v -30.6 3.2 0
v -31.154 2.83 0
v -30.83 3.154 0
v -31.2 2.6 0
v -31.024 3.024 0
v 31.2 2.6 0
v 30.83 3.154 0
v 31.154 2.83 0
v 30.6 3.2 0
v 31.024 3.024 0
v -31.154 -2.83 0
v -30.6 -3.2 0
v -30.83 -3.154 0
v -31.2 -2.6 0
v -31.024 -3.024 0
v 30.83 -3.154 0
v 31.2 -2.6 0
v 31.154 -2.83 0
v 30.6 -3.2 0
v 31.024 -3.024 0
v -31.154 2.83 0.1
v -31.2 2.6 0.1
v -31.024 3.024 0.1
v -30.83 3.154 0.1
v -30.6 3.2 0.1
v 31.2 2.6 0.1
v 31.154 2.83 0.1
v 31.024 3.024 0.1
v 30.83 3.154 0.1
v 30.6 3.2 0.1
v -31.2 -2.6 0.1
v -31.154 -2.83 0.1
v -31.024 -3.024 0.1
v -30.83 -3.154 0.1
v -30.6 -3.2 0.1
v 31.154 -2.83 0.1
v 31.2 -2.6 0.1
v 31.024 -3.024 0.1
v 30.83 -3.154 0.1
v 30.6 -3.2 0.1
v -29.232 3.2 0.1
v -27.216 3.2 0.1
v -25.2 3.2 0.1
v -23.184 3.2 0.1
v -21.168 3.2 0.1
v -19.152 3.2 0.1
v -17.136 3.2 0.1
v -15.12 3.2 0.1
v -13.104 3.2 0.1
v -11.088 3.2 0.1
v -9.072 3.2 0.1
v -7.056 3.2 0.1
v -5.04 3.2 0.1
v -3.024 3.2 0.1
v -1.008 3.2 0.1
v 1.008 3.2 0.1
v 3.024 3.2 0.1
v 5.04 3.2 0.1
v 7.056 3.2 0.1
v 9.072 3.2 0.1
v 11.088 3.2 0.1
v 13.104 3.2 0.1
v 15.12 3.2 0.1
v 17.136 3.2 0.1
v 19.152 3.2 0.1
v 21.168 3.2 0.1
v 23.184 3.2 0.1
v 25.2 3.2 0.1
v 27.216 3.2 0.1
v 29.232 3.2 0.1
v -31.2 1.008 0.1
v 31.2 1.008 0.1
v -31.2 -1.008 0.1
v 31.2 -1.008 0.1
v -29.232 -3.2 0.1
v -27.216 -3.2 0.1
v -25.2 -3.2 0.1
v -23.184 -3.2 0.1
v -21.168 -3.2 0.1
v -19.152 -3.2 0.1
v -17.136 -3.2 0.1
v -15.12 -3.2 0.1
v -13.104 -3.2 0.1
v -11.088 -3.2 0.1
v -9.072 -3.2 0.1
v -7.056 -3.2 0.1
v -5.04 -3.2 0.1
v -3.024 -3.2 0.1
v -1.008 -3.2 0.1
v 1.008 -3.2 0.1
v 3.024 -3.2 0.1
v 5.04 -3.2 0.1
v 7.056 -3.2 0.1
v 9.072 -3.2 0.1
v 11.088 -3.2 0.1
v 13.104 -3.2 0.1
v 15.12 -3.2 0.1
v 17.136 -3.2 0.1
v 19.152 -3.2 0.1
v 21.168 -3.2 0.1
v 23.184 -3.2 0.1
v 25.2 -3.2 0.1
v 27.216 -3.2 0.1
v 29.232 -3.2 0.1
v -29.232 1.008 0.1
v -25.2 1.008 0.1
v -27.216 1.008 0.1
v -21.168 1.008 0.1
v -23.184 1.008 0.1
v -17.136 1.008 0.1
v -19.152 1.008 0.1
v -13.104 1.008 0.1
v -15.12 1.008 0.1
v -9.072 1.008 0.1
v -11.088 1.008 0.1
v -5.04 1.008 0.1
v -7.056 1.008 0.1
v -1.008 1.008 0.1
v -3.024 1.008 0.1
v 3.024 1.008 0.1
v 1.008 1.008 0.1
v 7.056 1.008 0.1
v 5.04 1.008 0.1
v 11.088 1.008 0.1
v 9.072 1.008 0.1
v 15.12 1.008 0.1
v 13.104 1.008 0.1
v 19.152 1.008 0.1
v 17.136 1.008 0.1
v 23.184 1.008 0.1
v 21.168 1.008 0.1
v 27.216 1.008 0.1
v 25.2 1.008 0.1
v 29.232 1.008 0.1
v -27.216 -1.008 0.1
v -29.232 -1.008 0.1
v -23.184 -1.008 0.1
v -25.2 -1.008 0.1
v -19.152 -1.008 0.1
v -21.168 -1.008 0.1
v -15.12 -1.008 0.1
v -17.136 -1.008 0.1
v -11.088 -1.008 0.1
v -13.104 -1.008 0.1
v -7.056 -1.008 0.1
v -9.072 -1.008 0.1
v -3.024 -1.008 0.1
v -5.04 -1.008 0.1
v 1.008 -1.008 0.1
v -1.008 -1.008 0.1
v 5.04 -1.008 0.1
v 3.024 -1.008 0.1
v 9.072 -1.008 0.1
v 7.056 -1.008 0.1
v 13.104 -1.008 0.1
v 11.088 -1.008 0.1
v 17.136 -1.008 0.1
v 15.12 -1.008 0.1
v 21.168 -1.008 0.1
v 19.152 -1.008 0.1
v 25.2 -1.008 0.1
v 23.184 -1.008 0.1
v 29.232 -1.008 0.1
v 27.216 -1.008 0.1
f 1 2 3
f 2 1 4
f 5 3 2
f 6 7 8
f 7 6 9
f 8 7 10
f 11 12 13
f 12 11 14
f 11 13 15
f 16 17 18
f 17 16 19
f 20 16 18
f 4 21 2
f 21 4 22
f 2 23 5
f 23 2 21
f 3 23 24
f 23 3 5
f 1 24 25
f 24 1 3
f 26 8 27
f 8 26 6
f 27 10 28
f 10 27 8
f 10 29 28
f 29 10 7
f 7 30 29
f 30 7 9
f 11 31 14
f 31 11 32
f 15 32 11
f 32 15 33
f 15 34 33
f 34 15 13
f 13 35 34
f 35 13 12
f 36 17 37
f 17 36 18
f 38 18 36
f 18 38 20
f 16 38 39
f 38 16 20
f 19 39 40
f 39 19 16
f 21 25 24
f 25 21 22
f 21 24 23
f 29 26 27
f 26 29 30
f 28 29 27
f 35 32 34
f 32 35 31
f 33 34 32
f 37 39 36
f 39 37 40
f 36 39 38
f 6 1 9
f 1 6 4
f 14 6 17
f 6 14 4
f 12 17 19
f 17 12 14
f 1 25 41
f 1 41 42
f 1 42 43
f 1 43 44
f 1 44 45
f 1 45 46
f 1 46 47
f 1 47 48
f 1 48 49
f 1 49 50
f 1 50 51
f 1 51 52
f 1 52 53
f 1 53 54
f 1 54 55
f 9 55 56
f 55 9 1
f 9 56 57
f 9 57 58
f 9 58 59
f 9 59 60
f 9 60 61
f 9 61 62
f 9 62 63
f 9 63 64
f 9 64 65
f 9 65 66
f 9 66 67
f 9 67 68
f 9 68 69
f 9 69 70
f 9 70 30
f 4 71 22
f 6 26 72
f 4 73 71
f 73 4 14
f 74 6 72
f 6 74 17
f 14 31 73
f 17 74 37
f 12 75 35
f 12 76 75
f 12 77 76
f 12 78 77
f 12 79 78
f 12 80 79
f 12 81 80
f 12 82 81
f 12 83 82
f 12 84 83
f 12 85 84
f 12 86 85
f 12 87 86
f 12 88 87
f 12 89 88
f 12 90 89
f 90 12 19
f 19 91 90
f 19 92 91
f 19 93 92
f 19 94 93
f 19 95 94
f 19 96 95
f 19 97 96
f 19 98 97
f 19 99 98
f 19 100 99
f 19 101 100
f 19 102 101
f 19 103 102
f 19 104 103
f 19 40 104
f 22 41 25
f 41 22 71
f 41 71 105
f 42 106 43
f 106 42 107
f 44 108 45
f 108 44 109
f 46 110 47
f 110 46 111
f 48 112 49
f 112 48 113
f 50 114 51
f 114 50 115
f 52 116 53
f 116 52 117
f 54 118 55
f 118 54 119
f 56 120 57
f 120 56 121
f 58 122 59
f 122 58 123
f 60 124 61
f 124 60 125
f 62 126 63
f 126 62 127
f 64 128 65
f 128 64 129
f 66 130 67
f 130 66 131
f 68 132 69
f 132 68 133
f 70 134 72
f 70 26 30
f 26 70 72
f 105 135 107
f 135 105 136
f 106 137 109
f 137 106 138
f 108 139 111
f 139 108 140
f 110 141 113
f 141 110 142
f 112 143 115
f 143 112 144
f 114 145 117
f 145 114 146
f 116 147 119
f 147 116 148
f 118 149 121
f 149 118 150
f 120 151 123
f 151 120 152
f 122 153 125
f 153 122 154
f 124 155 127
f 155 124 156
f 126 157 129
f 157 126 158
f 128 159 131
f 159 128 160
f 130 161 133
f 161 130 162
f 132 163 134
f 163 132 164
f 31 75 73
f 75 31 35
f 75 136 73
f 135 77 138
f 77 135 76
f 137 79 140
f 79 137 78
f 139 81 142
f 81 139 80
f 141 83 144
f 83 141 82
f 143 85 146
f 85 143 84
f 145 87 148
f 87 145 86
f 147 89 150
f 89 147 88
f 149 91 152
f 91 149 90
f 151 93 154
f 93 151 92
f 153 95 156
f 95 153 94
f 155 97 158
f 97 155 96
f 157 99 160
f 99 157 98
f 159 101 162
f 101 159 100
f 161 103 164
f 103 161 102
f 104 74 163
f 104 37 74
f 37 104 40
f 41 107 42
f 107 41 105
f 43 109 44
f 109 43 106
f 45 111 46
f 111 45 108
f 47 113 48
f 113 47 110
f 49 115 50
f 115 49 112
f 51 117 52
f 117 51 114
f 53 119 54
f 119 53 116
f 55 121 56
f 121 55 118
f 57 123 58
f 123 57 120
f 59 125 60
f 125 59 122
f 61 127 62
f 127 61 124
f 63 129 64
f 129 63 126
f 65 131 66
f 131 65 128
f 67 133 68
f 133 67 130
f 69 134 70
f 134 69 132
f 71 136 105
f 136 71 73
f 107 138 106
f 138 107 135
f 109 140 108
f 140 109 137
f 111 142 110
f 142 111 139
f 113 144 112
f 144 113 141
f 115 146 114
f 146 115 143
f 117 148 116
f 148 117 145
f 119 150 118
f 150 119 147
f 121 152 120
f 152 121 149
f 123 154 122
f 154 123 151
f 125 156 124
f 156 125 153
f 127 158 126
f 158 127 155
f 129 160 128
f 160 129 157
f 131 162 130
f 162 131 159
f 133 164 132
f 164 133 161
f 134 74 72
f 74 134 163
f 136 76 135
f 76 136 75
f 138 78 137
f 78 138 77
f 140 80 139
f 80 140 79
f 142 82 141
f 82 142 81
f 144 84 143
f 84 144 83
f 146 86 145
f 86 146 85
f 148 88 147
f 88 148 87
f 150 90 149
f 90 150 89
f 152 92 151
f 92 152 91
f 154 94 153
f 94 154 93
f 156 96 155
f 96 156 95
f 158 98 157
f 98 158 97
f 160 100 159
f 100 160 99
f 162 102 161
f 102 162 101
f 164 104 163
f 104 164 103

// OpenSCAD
// file: ../p/1-4cyli.scad
use <../lib.scad>
function ldraw_lib__1_4cyli() = [
// 0 Cylinder 0.25
// 0 Name: 1-4cyli.dat
// 0 Author: James Jessiman
// 0 !LDRAW_ORG Primitive UPDATE 2012-01
// 0 !LICENSE Licensed under CC BY 4.0 : see CAreadme.txt
// 
// 0 BFC CERTIFY CCW
  [0,"BFC","CERTIFY"],
  [0,"BFC","CCW"],
// 
// 0 !HISTORY 2002-03-23 [sbliss] Added BFC statement.
// 0 !HISTORY 2002-04-25 [PTadmin] Official Update 2002-02
// 0 !HISTORY 2007-06-22 [PTadmin] Header formatted for Contributor Agreement
// 0 !HISTORY 2008-07-01 [PTadmin] Official Update 2008-01
// 0 !HISTORY 2012-02-16 [Philo] Changed to CCW
// 0 !HISTORY 2012-03-30 [PTadmin] Official Update 2012-01
// 
// 
// 4 16 1 1 0 0.9239 1 0.3827 0.9239 0 0.3827 1 0 0
  [4,16,1,1,0,0.9239,1,0.3827,0.9239,0,0.3827,1,0,0],
// 5 24 1 0 0 1 1 0 0.9239 0 0.3827 1 0 -1
  [5,24,1,0,0,1,1,0,0.9239,0,0.3827,1,0,-1],
// 4 16 0.9239 1 0.3827 0.7071 1 0.7071 0.7071 0 0.7071 0.9239 0 0.3827
  [4,16,0.9239,1,0.3827,0.7071,1,0.7071,0.7071,0,0.7071,0.9239,0,0.3827],
// 5 24 0.9239 0 0.3827 0.9239 1 0.3827 0.7071 0 0.7071 1 0 0
  [5,24,0.9239,0,0.3827,0.9239,1,0.3827,0.7071,0,0.7071,1,0,0],
// 4 16 0.7071 1 0.7071 0.3827 1 0.9239 0.3827 0 0.9239 0.7071 0 0.7071
  [4,16,0.7071,1,0.7071,0.3827,1,0.9239,0.3827,0,0.9239,0.7071,0,0.7071],
// 5 24 0.7071 0 0.7071 0.7071 1 0.7071 0.3827 0 0.9239 0.9239 0 0.3827
  [5,24,0.7071,0,0.7071,0.7071,1,0.7071,0.3827,0,0.9239,0.9239,0,0.3827],
// 4 16 0.3827 1 0.9239 0 1 1 0 0 1 0.3827 0 0.9239
  [4,16,0.3827,1,0.9239,0,1,1,0,0,1,0.3827,0,0.9239],
// 5 24 0.3827 0 0.9239 0.3827 1 0.9239 0 0 1 0.7071 0 0.7071
  [5,24,0.3827,0,0.9239,0.3827,1,0.9239,0,0,1,0.7071,0,0.7071],
// 5 24 0 0 1 0 1 1 0.3827 0 0.9239 -1 0 1
  [5,24,0,0,1,0,1,1,0.3827,0,0.9239,-1,0,1],
];
module ldraw_lib__1_4cyli(step=0, col=false, unit=2/5, alt=false, line=0.2, solid=!$preview)
    makepoly(ldraw_lib__1_4cyli(), step=step, col=col, unit=unit, alt=alt, line=line, solid=solid);
ldraw_lib__1_4cyli(line=0.2);
// file: ../p/1-4chrd.scad
use <../lib.scad>
function ldraw_lib__1_4chrd() = [
// 0 Chord 0.25
// 0 Name: 1-4chrd.dat
// 0 Author: Tony Hafner [hafhead]
// 0 !LDRAW_ORG Primitive UPDATE 2012-02
// 0 !LICENSE Licensed under CC BY 2.0 and CC BY 4.0 : see CAreadme.txt
// 
// 0 BFC CERTIFY CCW
  [0,"BFC","CERTIFY"],
  [0,"BFC","CCW"],
// 
// 0 !HISTORY 2004-04-22 [PTadmin] Official Update 2004-02
// 0 !HISTORY 2007-10-09 [PTadmin] Header formatted for Contributor Agreement
// 0 !HISTORY 2008-07-01 [PTadmin] Official Update 2008-01
// 0 !HISTORY 2012-08-02 [MMR1988] Re-creation with PrimGen2 and Rectifier
// 0 !HISTORY 2012-08-09 [PTadmin] Official Update 2012-02
// 
// 
// 4 16 0.9239 0 0.3827 0.3827 0 0.9239 0 0 1 1 0 0
  [4,16,0.9239,0,0.3827,0.3827,0,0.9239,0,0,1,1,0,0],
// 3 16 0.7071 0 0.7071 0.3827 0 0.9239 0.9239 0 0.3827
  [3,16,0.7071,0,0.7071,0.3827,0,0.9239,0.9239,0,0.3827],
];
module ldraw_lib__1_4chrd(step=0, col=false, unit=2/5, alt=false, line=0.2, solid=!$preview)
    makepoly(ldraw_lib__1_4chrd(), step=step, col=col, unit=unit, alt=alt, line=line, solid=solid);
ldraw_lib__1_4chrd(line=0.2);
// main file
use <../lib.scad>
use <../p/1-4chrd.scad>
use <../p/1-4cyli.scad>
function ldraw_lib__6142617ad() = [
// 0 Sticker  0.8 x  7.8 Chequered
// 0 Name: 6142617ad.dat
// 0 Author: Massimo Maso [Sirio]
// 0 !LDRAW_ORG Part UPDATE 2023-02
// 0 !LICENSE Licensed under CC BY 4.0 : see CAreadme.txt
// 
// 0 BFC CERTIFY CCW
  [0,"BFC","CERTIFY"],
  [0,"BFC","CCW"],
// 
// 0 !KEYWORDS Camaro, Chevrolet, Drag, Race, Set 75874, Speed Champions, SS, Z/28
// 
// 0 !HISTORY 2023-04-17 [OrionP] Official Update 2023-02
// 
// 
// 0 // Primitives
// 
// 1 16 -76.5 0 6.5 -1.5 0 0 0 -1 0 0 0 1.5 1-4chrd.dat
  [1,16,-76.5,0,6.5,-1.5,0,0,0,-1,0,0,0,1.5, ldraw_lib__1_4chrd()],
// 1 16 76.5 0 6.5 1.5 0 0 0 -1 0 0 0 1.5 1-4chrd.dat
  [1,16,76.5,0,6.5,1.5,0,0,0,-1,0,0,0,1.5, ldraw_lib__1_4chrd()],
// 1 16 -76.5 0 -6.5 -1.5 0 0 0 -1 0 0 0 -1.5 1-4chrd.dat
  [1,16,-76.5,0,-6.5,-1.5,0,0,0,-1,0,0,0,-1.5, ldraw_lib__1_4chrd()],
// 1 16 76.5 0 -6.5 1.5 0 0 0 -1 0 0 0 -1.5 1-4chrd.dat
  [1,16,76.5,0,-6.5,1.5,0,0,0,-1,0,0,0,-1.5, ldraw_lib__1_4chrd()],
// 1 16 -76.5 0 6.5 -1.5 0 0 0 -.25 0 0 0 1.5 1-4cyli.dat
  [1,16,-76.5,0,6.5,-1.5,0,0,0,-.25,0,0,0,1.5, ldraw_lib__1_4cyli()],
// 1 16 76.5 0 6.5 1.5 0 0 0 -.25 0 0 0 1.5 1-4cyli.dat
  [1,16,76.5,0,6.5,1.5,0,0,0,-.25,0,0,0,1.5, ldraw_lib__1_4cyli()],
// 1 16 -76.5 0 -6.5 -1.5 0 0 0 -.25 0 0 0 -1.5 1-4cyli.dat
  [1,16,-76.5,0,-6.5,-1.5,0,0,0,-.25,0,0,0,-1.5, ldraw_lib__1_4cyli()],
// 1 16 76.5 0 -6.5 1.5 0 0 0 -.25 0 0 0 -1.5 1-4cyli.dat
  [1,16,76.5,0,-6.5,1.5,0,0,0,-.25,0,0,0,-1.5, ldraw_lib__1_4cyli()],
// 1 0 -76.5 -.25 6.5 -1.5 0 0 0 1 0 0 0 1.5 1-4chrd.dat
  [1,0,-76.5,-.25,6.5,-1.5,0,0,0,1,0,0,0,1.5, ldraw_lib__1_4chrd()],
// 1 0 76.5 -.25 6.5 1.5 0 0 0 1 0 0 0 1.5 1-4chrd.dat
  [1,0,76.5,-.25,6.5,1.5,0,0,0,1,0,0,0,1.5, ldraw_lib__1_4chrd()],
// 1 0 -76.5 -.25 -6.5 -1.5 0 0 0 1 0 0 0 -1.5 1-4chrd.dat
  [1,0,-76.5,-.25,-6.5,-1.5,0,0,0,1,0,0,0,-1.5, ldraw_lib__1_4chrd()],
// 1 0 76.5 -.25 -6.5 1.5 0 0 0 1 0 0 0 -1.5 1-4chrd.dat
  [1,0,76.5,-.25,-6.5,1.5,0,0,0,1,0,0,0,-1.5, ldraw_lib__1_4chrd()],
// 0 // Bottom face
// 4 16 76.5 0 8 78 0 6.5 -78 0 6.5 -76.5 0 8
  [4,16,76.5,0,8,78,0,6.5,-78,0,6.5,-76.5,0,8],
// 4 16 78 0 6.5 78 0 -6.5 -78 0 -6.5 -78 0 6.5
  [4,16,78,0,6.5,78,0,-6.5,-78,0,-6.5,-78,0,6.5],
// 4 16 76.5 0 -8 -76.5 0 -8 -78 0 -6.5 78 0 -6.5
  [4,16,76.5,0,-8,-76.5,0,-8,-78,0,-6.5,78,0,-6.5],
// 0 // Lateral face
// 3 16 -76.5 0 8 -76.5 -.25 8 -73.08 -.25 8
  [3,16,-76.5,0,8,-76.5,-.25,8,-73.08,-.25,8],
// 3 16 -76.5 0 8 -73.08 -.25 8 -68.04 -.25 8
  [3,16,-76.5,0,8,-73.08,-.25,8,-68.04,-.25,8],
// 3 16 -76.5 0 8 -68.04 -.25 8 -63 -.25 8
  [3,16,-76.5,0,8,-68.04,-.25,8,-63,-.25,8],
// 3 16 -76.5 0 8 -63 -.25 8 -57.96 -.25 8
  [3,16,-76.5,0,8,-63,-.25,8,-57.96,-.25,8],
// 3 16 -76.5 0 8 -57.96 -.25 8 -52.92 -.25 8
  [3,16,-76.5,0,8,-57.96,-.25,8,-52.92,-.25,8],
// 3 16 -76.5 0 8 -52.92 -.25 8 -47.88 -.25 8
  [3,16,-76.5,0,8,-52.92,-.25,8,-47.88,-.25,8],
// 3 16 -76.5 0 8 -47.88 -.25 8 -42.84 -.25 8
  [3,16,-76.5,0,8,-47.88,-.25,8,-42.84,-.25,8],
// 3 16 -76.5 0 8 -42.84 -.25 8 -37.8 -.25 8
  [3,16,-76.5,0,8,-42.84,-.25,8,-37.8,-.25,8],
// 3 16 -76.5 0 8 -37.8 -.25 8 -32.76 -.25 8
  [3,16,-76.5,0,8,-37.8,-.25,8,-32.76,-.25,8],
// 3 16 -76.5 0 8 -32.76 -.25 8 -27.72 -.25 8
  [3,16,-76.5,0,8,-32.76,-.25,8,-27.72,-.25,8],
// 3 16 -76.5 0 8 -27.72 -.25 8 -22.68 -.25 8
  [3,16,-76.5,0,8,-27.72,-.25,8,-22.68,-.25,8],
// 3 16 -76.5 0 8 -22.68 -.25 8 -17.64 -.25 8
  [3,16,-76.5,0,8,-22.68,-.25,8,-17.64,-.25,8],
// 3 16 -76.5 0 8 -17.64 -.25 8 -12.6 -.25 8
  [3,16,-76.5,0,8,-17.64,-.25,8,-12.6,-.25,8],
// 3 16 -76.5 0 8 -12.6 -.25 8 -7.56 -.25 8
  [3,16,-76.5,0,8,-12.6,-.25,8,-7.56,-.25,8],
// 3 16 -76.5 0 8 -7.56 -.25 8 -2.52 -.25 8
  [3,16,-76.5,0,8,-7.56,-.25,8,-2.52,-.25,8],
// 4 16 -76.5 0 8 -2.52 -.25 8 2.52 -.25 8 76.5 0 8
  [4,16,-76.5,0,8,-2.52,-.25,8,2.52,-.25,8,76.5,0,8],
// 3 16 76.5 0 8 2.52 -.25 8 7.56 -.25 8
  [3,16,76.5,0,8,2.52,-.25,8,7.56,-.25,8],
// 3 16 76.5 0 8 7.56 -.25 8 12.6 -.25 8
  [3,16,76.5,0,8,7.56,-.25,8,12.6,-.25,8],
// 3 16 76.5 0 8 12.6 -.25 8 17.64 -.25 8
  [3,16,76.5,0,8,12.6,-.25,8,17.64,-.25,8],
// 3 16 76.5 0 8 17.64 -.25 8 22.68 -.25 8
  [3,16,76.5,0,8,17.64,-.25,8,22.68,-.25,8],
// 3 16 76.5 0 8 22.68 -.25 8 27.72 -.25 8
  [3,16,76.5,0,8,22.68,-.25,8,27.72,-.25,8],
// 3 16 76.5 0 8 27.72 -.25 8 32.76 -.25 8
  [3,16,76.5,0,8,27.72,-.25,8,32.76,-.25,8],
// 3 16 76.5 0 8 32.76 -.25 8 37.8 -.25 8
  [3,16,76.5,0,8,32.76,-.25,8,37.8,-.25,8],
// 3 16 76.5 0 8 37.8 -.25 8 42.84 -.25 8
  [3,16,76.5,0,8,37.8,-.25,8,42.84,-.25,8],
// 3 16 76.5 0 8 42.84 -.25 8 47.88 -.25 8
  [3,16,76.5,0,8,42.84,-.25,8,47.88,-.25,8],
// 3 16 76.5 0 8 47.88 -.25 8 52.92 -.25 8
  [3,16,76.5,0,8,47.88,-.25,8,52.92,-.25,8],
// 3 16 76.5 0 8 52.92 -.25 8 57.96 -.25 8
  [3,16,76.5,0,8,52.92,-.25,8,57.96,-.25,8],
// 3 16 76.5 0 8 57.96 -.25 8 63 -.25 8
  [3,16,76.5,0,8,57.96,-.25,8,63,-.25,8],
// 3 16 76.5 0 8 63 -.25 8 68.04 -.25 8
  [3,16,76.5,0,8,63,-.25,8,68.04,-.25,8],
// 3 16 76.5 0 8 68.04 -.25 8 73.08 -.25 8
  [3,16,76.5,0,8,68.04,-.25,8,73.08,-.25,8],
// 3 16 76.5 0 8 73.08 -.25 8 76.5 -.25 8
  [3,16,76.5,0,8,73.08,-.25,8,76.5,-.25,8],
// 3 16 -78 0 6.5 -78 -.25 2.52 -78 -.25 6.5
  [3,16,-78,0,6.5,-78,-.25,2.52,-78,-.25,6.5],
// 3 16 78 0 6.5 78 -.25 6.5 78 -.25 2.52
  [3,16,78,0,6.5,78,-.25,6.5,78,-.25,2.52],
// 4 16 -78 0 6.5 -78 0 -6.5 -78 -.25 -2.52 -78 -.25 2.52
  [4,16,-78,0,6.5,-78,0,-6.5,-78,-.25,-2.52,-78,-.25,2.52],
// 4 16 78 0 6.5 78 -.25 2.52 78 -.25 -2.52 78 0 -6.5
  [4,16,78,0,6.5,78,-.25,2.52,78,-.25,-2.52,78,0,-6.5],
// 3 16 -78 0 -6.5 -78 -.25 -6.5 -78 -.25 -2.52
  [3,16,-78,0,-6.5,-78,-.25,-6.5,-78,-.25,-2.52],
// 3 16 78 0 -6.5 78 -.25 -2.52 78 -.25 -6.5
  [3,16,78,0,-6.5,78,-.25,-2.52,78,-.25,-6.5],
// 3 16 -76.5 0 -8 -73.08 -.25 -8 -76.5 -.25 -8
  [3,16,-76.5,0,-8,-73.08,-.25,-8,-76.5,-.25,-8],
// 3 16 -76.5 0 -8 -68.04 -.25 -8 -73.08 -.25 -8
  [3,16,-76.5,0,-8,-68.04,-.25,-8,-73.08,-.25,-8],
// 3 16 -76.5 0 -8 -63 -.25 -8 -68.04 -.25 -8
  [3,16,-76.5,0,-8,-63,-.25,-8,-68.04,-.25,-8],
// 3 16 -76.5 0 -8 -57.96 -.25 -8 -63 -.25 -8
  [3,16,-76.5,0,-8,-57.96,-.25,-8,-63,-.25,-8],
// 3 16 -76.5 0 -8 -52.92 -.25 -8 -57.96 -.25 -8
  [3,16,-76.5,0,-8,-52.92,-.25,-8,-57.96,-.25,-8],
// 3 16 -76.5 0 -8 -47.88 -.25 -8 -52.92 -.25 -8
  [3,16,-76.5,0,-8,-47.88,-.25,-8,-52.92,-.25,-8],
// 3 16 -76.5 0 -8 -42.84 -.25 -8 -47.88 -.25 -8
  [3,16,-76.5,0,-8,-42.84,-.25,-8,-47.88,-.25,-8],
// 3 16 -76.5 0 -8 -37.8 -.25 -8 -42.84 -.25 -8
  [3,16,-76.5,0,-8,-37.8,-.25,-8,-42.84,-.25,-8],
// 3 16 -76.5 0 -8 -32.76 -.25 -8 -37.8 -.25 -8
  [3,16,-76.5,0,-8,-32.76,-.25,-8,-37.8,-.25,-8],
// 3 16 -76.5 0 -8 -27.72 -.25 -8 -32.76 -.25 -8
  [3,16,-76.5,0,-8,-27.72,-.25,-8,-32.76,-.25,-8],
// 3 16 -76.5 0 -8 -22.68 -.25 -8 -27.72 -.25 -8
  [3,16,-76.5,0,-8,-22.68,-.25,-8,-27.72,-.25,-8],
// 3 16 -76.5 0 -8 -17.64 -.25 -8 -22.68 -.25 -8
  [3,16,-76.5,0,-8,-17.64,-.25,-8,-22.68,-.25,-8],
// 3 16 -76.5 0 -8 -12.6 -.25 -8 -17.64 -.25 -8
  [3,16,-76.5,0,-8,-12.6,-.25,-8,-17.64,-.25,-8],
// 3 16 -76.5 0 -8 -7.56 -.25 -8 -12.6 -.25 -8
  [3,16,-76.5,0,-8,-7.56,-.25,-8,-12.6,-.25,-8],
// 3 16 -76.5 0 -8 -2.52 -.25 -8 -7.56 -.25 -8
  [3,16,-76.5,0,-8,-2.52,-.25,-8,-7.56,-.25,-8],
// 4 16 -76.5 0 -8 76.5 0 -8 2.52 -.25 -8 -2.52 -.25 -8
  [4,16,-76.5,0,-8,76.5,0,-8,2.52,-.25,-8,-2.52,-.25,-8],
// 3 16 76.5 0 -8 7.56 -.25 -8 2.52 -.25 -8
  [3,16,76.5,0,-8,7.56,-.25,-8,2.52,-.25,-8],
// 3 16 76.5 0 -8 12.6 -.25 -8 7.56 -.25 -8
  [3,16,76.5,0,-8,12.6,-.25,-8,7.56,-.25,-8],
// 3 16 76.5 0 -8 17.64 -.25 -8 12.6 -.25 -8
  [3,16,76.5,0,-8,17.64,-.25,-8,12.6,-.25,-8],
// 3 16 76.5 0 -8 22.68 -.25 -8 17.64 -.25 -8
  [3,16,76.5,0,-8,22.68,-.25,-8,17.64,-.25,-8],
// 3 16 76.5 0 -8 27.72 -.25 -8 22.68 -.25 -8
  [3,16,76.5,0,-8,27.72,-.25,-8,22.68,-.25,-8],
// 3 16 76.5 0 -8 32.76 -.25 -8 27.72 -.25 -8
  [3,16,76.5,0,-8,32.76,-.25,-8,27.72,-.25,-8],
// 3 16 76.5 0 -8 37.8 -.25 -8 32.76 -.25 -8
  [3,16,76.5,0,-8,37.8,-.25,-8,32.76,-.25,-8],
// 3 16 76.5 0 -8 42.84 -.25 -8 37.8 -.25 -8
  [3,16,76.5,0,-8,42.84,-.25,-8,37.8,-.25,-8],
// 3 16 76.5 0 -8 47.88 -.25 -8 42.84 -.25 -8
  [3,16,76.5,0,-8,47.88,-.25,-8,42.84,-.25,-8],
// 3 16 76.5 0 -8 52.92 -.25 -8 47.88 -.25 -8
  [3,16,76.5,0,-8,52.92,-.25,-8,47.88,-.25,-8],
// 3 16 76.5 0 -8 57.96 -.25 -8 52.92 -.25 -8
  [3,16,76.5,0,-8,57.96,-.25,-8,52.92,-.25,-8],
// 3 16 76.5 0 -8 63 -.25 -8 57.96 -.25 -8
  [3,16,76.5,0,-8,63,-.25,-8,57.96,-.25,-8],
// 3 16 76.5 0 -8 68.04 -.25 -8 63 -.25 -8
  [3,16,76.5,0,-8,68.04,-.25,-8,63,-.25,-8],
// 3 16 76.5 0 -8 73.08 -.25 -8 68.04 -.25 -8
  [3,16,76.5,0,-8,73.08,-.25,-8,68.04,-.25,-8],
// 3 16 76.5 0 -8 76.5 -.25 -8 73.08 -.25 -8
  [3,16,76.5,0,-8,76.5,-.25,-8,73.08,-.25,-8],
// 0 // Top face
// 0 // Black faces
// 4 0 -73.08 -.25 8 -76.5 -.25 8 -78 -.25 6.5 -78 -.25 2.52
  [4,0,-73.08,-.25,8,-76.5,-.25,8,-78,-.25,6.5,-78,-.25,2.52],
// 3 0 -73.08 -.25 8 -78 -.25 2.52 -73.08 -.25 2.52
  [3,0,-73.08,-.25,8,-78,-.25,2.52,-73.08,-.25,2.52],
// 4 0 -68.04 -.25 8 -68.04 -.25 2.52 -63 -.25 2.52 -63 -.25 8
  [4,0,-68.04,-.25,8,-68.04,-.25,2.52,-63,-.25,2.52,-63,-.25,8],
// 4 0 -57.96 -.25 8 -57.96 -.25 2.52 -52.92 -.25 2.52 -52.92 -.25 8
  [4,0,-57.96,-.25,8,-57.96,-.25,2.52,-52.92,-.25,2.52,-52.92,-.25,8],
// 4 0 -47.88 -.25 8 -47.88 -.25 2.52 -42.84 -.25 2.52 -42.84 -.25 8
  [4,0,-47.88,-.25,8,-47.88,-.25,2.52,-42.84,-.25,2.52,-42.84,-.25,8],
// 4 0 -37.8 -.25 8 -37.8 -.25 2.52 -32.76 -.25 2.52 -32.76 -.25 8
  [4,0,-37.8,-.25,8,-37.8,-.25,2.52,-32.76,-.25,2.52,-32.76,-.25,8],
// 4 0 -27.72 -.25 8 -27.72 -.25 2.52 -22.68 -.25 2.52 -22.68 -.25 8
  [4,0,-27.72,-.25,8,-27.72,-.25,2.52,-22.68,-.25,2.52,-22.68,-.25,8],
// 4 0 -17.64 -.25 8 -17.64 -.25 2.52 -12.6 -.25 2.52 -12.6 -.25 8
  [4,0,-17.64,-.25,8,-17.64,-.25,2.52,-12.6,-.25,2.52,-12.6,-.25,8],
// 4 0 -7.56 -.25 8 -7.56 -.25 2.52 -2.52 -.25 2.52 -2.52 -.25 8
  [4,0,-7.56,-.25,8,-7.56,-.25,2.52,-2.52,-.25,2.52,-2.52,-.25,8],
// 4 0 2.52 -.25 8 2.52 -.25 2.52 7.56 -.25 2.52 7.56 -.25 8
  [4,0,2.52,-.25,8,2.52,-.25,2.52,7.56,-.25,2.52,7.56,-.25,8],
// 4 0 12.6 -.25 8 12.6 -.25 2.52 17.64 -.25 2.52 17.64 -.25 8
  [4,0,12.6,-.25,8,12.6,-.25,2.52,17.64,-.25,2.52,17.64,-.25,8],
// 4 0 22.68 -.25 8 22.68 -.25 2.52 27.72 -.25 2.52 27.72 -.25 8
  [4,0,22.68,-.25,8,22.68,-.25,2.52,27.72,-.25,2.52,27.72,-.25,8],
// 4 0 32.76 -.25 8 32.76 -.25 2.52 37.8 -.25 2.52 37.8 -.25 8
  [4,0,32.76,-.25,8,32.76,-.25,2.52,37.8,-.25,2.52,37.8,-.25,8],
// 4 0 42.84 -.25 8 42.84 -.25 2.52 47.88 -.25 2.52 47.88 -.25 8
  [4,0,42.84,-.25,8,42.84,-.25,2.52,47.88,-.25,2.52,47.88,-.25,8],
// 4 0 52.92 -.25 8 52.92 -.25 2.52 57.96 -.25 2.52 57.96 -.25 8
  [4,0,52.92,-.25,8,52.92,-.25,2.52,57.96,-.25,2.52,57.96,-.25,8],
// 4 0 63 -.25 8 63 -.25 2.52 68.04 -.25 2.52 68.04 -.25 8
  [4,0,63,-.25,8,63,-.25,2.52,68.04,-.25,2.52,68.04,-.25,8],
// 3 0 73.08 -.25 8 73.08 -.25 2.52 78 -.25 2.52
  [3,0,73.08,-.25,8,73.08,-.25,2.52,78,-.25,2.52],
// 4 0 73.08 -.25 8 78 -.25 2.52 78 -.25 6.5 76.5 -.25 8
  [4,0,73.08,-.25,8,78,-.25,2.52,78,-.25,6.5,76.5,-.25,8],
// 4 0 -73.08 -.25 2.52 -73.08 -.25 -2.52 -68.04 -.25 -2.52 -68.04 -.25 2.52
  [4,0,-73.08,-.25,2.52,-73.08,-.25,-2.52,-68.04,-.25,-2.52,-68.04,-.25,2.52],
// 4 0 -63 -.25 2.52 -63 -.25 -2.52 -57.96 -.25 -2.52 -57.96 -.25 2.52
  [4,0,-63,-.25,2.52,-63,-.25,-2.52,-57.96,-.25,-2.52,-57.96,-.25,2.52],
// 4 0 -52.92 -.25 2.52 -52.92 -.25 -2.52 -47.88 -.25 -2.52 -47.88 -.25 2.52
  [4,0,-52.92,-.25,2.52,-52.92,-.25,-2.52,-47.88,-.25,-2.52,-47.88,-.25,2.52],
// 4 0 -42.84 -.25 2.52 -42.84 -.25 -2.52 -37.8 -.25 -2.52 -37.8 -.25 2.52
  [4,0,-42.84,-.25,2.52,-42.84,-.25,-2.52,-37.8,-.25,-2.52,-37.8,-.25,2.52],
// 4 0 -32.76 -.25 2.52 -32.76 -.25 -2.52 -27.72 -.25 -2.52 -27.72 -.25 2.52
  [4,0,-32.76,-.25,2.52,-32.76,-.25,-2.52,-27.72,-.25,-2.52,-27.72,-.25,2.52],
// 4 0 -22.68 -.25 2.52 -22.68 -.25 -2.52 -17.64 -.25 -2.52 -17.64 -.25 2.52
  [4,0,-22.68,-.25,2.52,-22.68,-.25,-2.52,-17.64,-.25,-2.52,-17.64,-.25,2.52],
// 4 0 -12.6 -.25 2.52 -12.6 -.25 -2.52 -7.56 -.25 -2.52 -7.56 -.25 2.52
  [4,0,-12.6,-.25,2.52,-12.6,-.25,-2.52,-7.56,-.25,-2.52,-7.56,-.25,2.52],
// 4 0 -2.52 -.25 2.52 -2.52 -.25 -2.52 2.52 -.25 -2.52 2.52 -.25 2.52
  [4,0,-2.52,-.25,2.52,-2.52,-.25,-2.52,2.52,-.25,-2.52,2.52,-.25,2.52],
// 4 0 7.56 -.25 2.52 7.56 -.25 -2.52 12.6 -.25 -2.52 12.6 -.25 2.52
  [4,0,7.56,-.25,2.52,7.56,-.25,-2.52,12.6,-.25,-2.52,12.6,-.25,2.52],
// 4 0 17.64 -.25 2.52 17.64 -.25 -2.52 22.68 -.25 -2.52 22.68 -.25 2.52
  [4,0,17.64,-.25,2.52,17.64,-.25,-2.52,22.68,-.25,-2.52,22.68,-.25,2.52],
// 4 0 27.72 -.25 2.52 27.72 -.25 -2.52 32.76 -.25 -2.52 32.76 -.25 2.52
  [4,0,27.72,-.25,2.52,27.72,-.25,-2.52,32.76,-.25,-2.52,32.76,-.25,2.52],
// 4 0 37.8 -.25 2.52 37.8 -.25 -2.52 42.84 -.25 -2.52 42.84 -.25 2.52
  [4,0,37.8,-.25,2.52,37.8,-.25,-2.52,42.84,-.25,-2.52,42.84,-.25,2.52],
// 4 0 47.88 -.25 2.52 47.88 -.25 -2.52 52.92 -.25 -2.52 52.92 -.25 2.52
  [4,0,47.88,-.25,2.52,47.88,-.25,-2.52,52.92,-.25,-2.52,52.92,-.25,2.52],
// 4 0 57.96 -.25 2.52 57.96 -.25 -2.52 63 -.25 -2.52 63 -.25 2.52
  [4,0,57.96,-.25,2.52,57.96,-.25,-2.52,63,-.25,-2.52,63,-.25,2.52],
// 4 0 68.04 -.25 2.52 68.04 -.25 -2.52 73.08 -.25 -2.52 73.08 -.25 2.52
  [4,0,68.04,-.25,2.52,68.04,-.25,-2.52,73.08,-.25,-2.52,73.08,-.25,2.52],
// 4 0 -73.08 -.25 -8 -78 -.25 -2.52 -78 -.25 -6.5 -76.5 -.25 -8
  [4,0,-73.08,-.25,-8,-78,-.25,-2.52,-78,-.25,-6.5,-76.5,-.25,-8],
// 3 0 -73.08 -.25 -8 -73.08 -.25 -2.52 -78 -.25 -2.52
  [3,0,-73.08,-.25,-8,-73.08,-.25,-2.52,-78,-.25,-2.52],
// 4 0 -68.04 -.25 -2.52 -68.04 -.25 -8 -63 -.25 -8 -63 -.25 -2.52
  [4,0,-68.04,-.25,-2.52,-68.04,-.25,-8,-63,-.25,-8,-63,-.25,-2.52],
// 4 0 -57.96 -.25 -2.52 -57.96 -.25 -8 -52.92 -.25 -8 -52.92 -.25 -2.52
  [4,0,-57.96,-.25,-2.52,-57.96,-.25,-8,-52.92,-.25,-8,-52.92,-.25,-2.52],
// 4 0 -47.88 -.25 -2.52 -47.88 -.25 -8 -42.84 -.25 -8 -42.84 -.25 -2.52
  [4,0,-47.88,-.25,-2.52,-47.88,-.25,-8,-42.84,-.25,-8,-42.84,-.25,-2.52],
// 4 0 -37.8 -.25 -2.52 -37.8 -.25 -8 -32.76 -.25 -8 -32.76 -.25 -2.52
  [4,0,-37.8,-.25,-2.52,-37.8,-.25,-8,-32.76,-.25,-8,-32.76,-.25,-2.52],
// 4 0 -27.72 -.25 -2.52 -27.72 -.25 -8 -22.68 -.25 -8 -22.68 -.25 -2.52
  [4,0,-27.72,-.25,-2.52,-27.72,-.25,-8,-22.68,-.25,-8,-22.68,-.25,-2.52],
// 4 0 -17.64 -.25 -2.52 -17.64 -.25 -8 -12.6 -.25 -8 -12.6 -.25 -2.52
  [4,0,-17.64,-.25,-2.52,-17.64,-.25,-8,-12.6,-.25,-8,-12.6,-.25,-2.52],
// 4 0 -7.56 -.25 -2.52 -7.56 -.25 -8 -2.52 -.25 -8 -2.52 -.25 -2.52
  [4,0,-7.56,-.25,-2.52,-7.56,-.25,-8,-2.52,-.25,-8,-2.52,-.25,-2.52],
// 4 0 2.52 -.25 -2.52 2.52 -.25 -8 7.56 -.25 -8 7.56 -.25 -2.52
  [4,0,2.52,-.25,-2.52,2.52,-.25,-8,7.56,-.25,-8,7.56,-.25,-2.52],
// 4 0 12.6 -.25 -2.52 12.6 -.25 -8 17.64 -.25 -8 17.64 -.25 -2.52
  [4,0,12.6,-.25,-2.52,12.6,-.25,-8,17.64,-.25,-8,17.64,-.25,-2.52],
// 4 0 22.68 -.25 -2.52 22.68 -.25 -8 27.72 -.25 -8 27.72 -.25 -2.52
  [4,0,22.68,-.25,-2.52,22.68,-.25,-8,27.72,-.25,-8,27.72,-.25,-2.52],
// 4 0 32.76 -.25 -2.52 32.76 -.25 -8 37.8 -.25 -8 37.8 -.25 -2.52
  [4,0,32.76,-.25,-2.52,32.76,-.25,-8,37.8,-.25,-8,37.8,-.25,-2.52],
// 4 0 42.84 -.25 -2.52 42.84 -.25 -8 47.88 -.25 -8 47.88 -.25 -2.52
  [4,0,42.84,-.25,-2.52,42.84,-.25,-8,47.88,-.25,-8,47.88,-.25,-2.52],
// 4 0 52.92 -.25 -2.52 52.92 -.25 -8 57.96 -.25 -8 57.96 -.25 -2.52
  [4,0,52.92,-.25,-2.52,52.92,-.25,-8,57.96,-.25,-8,57.96,-.25,-2.52],
// 4 0 63 -.25 -2.52 63 -.25 -8 68.04 -.25 -8 68.04 -.25 -2.52
  [4,0,63,-.25,-2.52,63,-.25,-8,68.04,-.25,-8,68.04,-.25,-2.52],
// 3 0 73.08 -.25 -8 78 -.25 -2.52 73.08 -.25 -2.52
  [3,0,73.08,-.25,-8,78,-.25,-2.52,73.08,-.25,-2.52],
// 4 0 73.08 -.25 -8 76.5 -.25 -8 78 -.25 -6.5 78 -.25 -2.52
  [4,0,73.08,-.25,-8,76.5,-.25,-8,78,-.25,-6.5,78,-.25,-2.52],
// 0 // White faces
// 4 15 -73.08 -.25 8 -73.08 -.25 2.52 -68.04 -.25 2.52 -68.04 -.25 8
  [4,15,-73.08,-.25,8,-73.08,-.25,2.52,-68.04,-.25,2.52,-68.04,-.25,8],
// 4 15 -63 -.25 8 -63 -.25 2.52 -57.96 -.25 2.52 -57.96 -.25 8
  [4,15,-63,-.25,8,-63,-.25,2.52,-57.96,-.25,2.52,-57.96,-.25,8],
// 4 15 -52.92 -.25 8 -52.92 -.25 2.52 -47.88 -.25 2.52 -47.88 -.25 8
  [4,15,-52.92,-.25,8,-52.92,-.25,2.52,-47.88,-.25,2.52,-47.88,-.25,8],
// 4 15 -42.84 -.25 8 -42.84 -.25 2.52 -37.8 -.25 2.52 -37.8 -.25 8
  [4,15,-42.84,-.25,8,-42.84,-.25,2.52,-37.8,-.25,2.52,-37.8,-.25,8],
// 4 15 -32.76 -.25 8 -32.76 -.25 2.52 -27.72 -.25 2.52 -27.72 -.25 8
  [4,15,-32.76,-.25,8,-32.76,-.25,2.52,-27.72,-.25,2.52,-27.72,-.25,8],
// 4 15 -22.68 -.25 8 -22.68 -.25 2.52 -17.64 -.25 2.52 -17.64 -.25 8
  [4,15,-22.68,-.25,8,-22.68,-.25,2.52,-17.64,-.25,2.52,-17.64,-.25,8],
// 4 15 -12.6 -.25 8 -12.6 -.25 2.52 -7.56 -.25 2.52 -7.56 -.25 8
  [4,15,-12.6,-.25,8,-12.6,-.25,2.52,-7.56,-.25,2.52,-7.56,-.25,8],
// 4 15 -2.52 -.25 8 -2.52 -.25 2.52 2.52 -.25 2.52 2.52 -.25 8
  [4,15,-2.52,-.25,8,-2.52,-.25,2.52,2.52,-.25,2.52,2.52,-.25,8],
// 4 15 7.56 -.25 8 7.56 -.25 2.52 12.6 -.25 2.52 12.6 -.25 8
  [4,15,7.56,-.25,8,7.56,-.25,2.52,12.6,-.25,2.52,12.6,-.25,8],
// 4 15 17.64 -.25 8 17.64 -.25 2.52 22.68 -.25 2.52 22.68 -.25 8
  [4,15,17.64,-.25,8,17.64,-.25,2.52,22.68,-.25,2.52,22.68,-.25,8],
// 4 15 27.72 -.25 8 27.72 -.25 2.52 32.76 -.25 2.52 32.76 -.25 8
  [4,15,27.72,-.25,8,27.72,-.25,2.52,32.76,-.25,2.52,32.76,-.25,8],
// 4 15 37.8 -.25 8 37.8 -.25 2.52 42.84 -.25 2.52 42.84 -.25 8
  [4,15,37.8,-.25,8,37.8,-.25,2.52,42.84,-.25,2.52,42.84,-.25,8],
// 4 15 47.88 -.25 8 47.88 -.25 2.52 52.92 -.25 2.52 52.92 -.25 8
  [4,15,47.88,-.25,8,47.88,-.25,2.52,52.92,-.25,2.52,52.92,-.25,8],
// 4 15 57.96 -.25 8 57.96 -.25 2.52 63 -.25 2.52 63 -.25 8
  [4,15,57.96,-.25,8,57.96,-.25,2.52,63,-.25,2.52,63,-.25,8],
// 4 15 68.04 -.25 8 68.04 -.25 2.52 73.08 -.25 2.52 73.08 -.25 8
  [4,15,68.04,-.25,8,68.04,-.25,2.52,73.08,-.25,2.52,73.08,-.25,8],
// 4 15 -78 -.25 2.52 -78 -.25 -2.52 -73.08 -.25 -2.52 -73.08 -.25 2.52
  [4,15,-78,-.25,2.52,-78,-.25,-2.52,-73.08,-.25,-2.52,-73.08,-.25,2.52],
// 4 15 -68.04 -.25 2.52 -68.04 -.25 -2.52 -63 -.25 -2.52 -63 -.25 2.52
  [4,15,-68.04,-.25,2.52,-68.04,-.25,-2.52,-63,-.25,-2.52,-63,-.25,2.52],
// 4 15 -57.96 -.25 2.52 -57.96 -.25 -2.52 -52.92 -.25 -2.52 -52.92 -.25 2.52
  [4,15,-57.96,-.25,2.52,-57.96,-.25,-2.52,-52.92,-.25,-2.52,-52.92,-.25,2.52],
// 4 15 -47.88 -.25 2.52 -47.88 -.25 -2.52 -42.84 -.25 -2.52 -42.84 -.25 2.52
  [4,15,-47.88,-.25,2.52,-47.88,-.25,-2.52,-42.84,-.25,-2.52,-42.84,-.25,2.52],
// 4 15 -37.8 -.25 2.52 -37.8 -.25 -2.52 -32.76 -.25 -2.52 -32.76 -.25 2.52
  [4,15,-37.8,-.25,2.52,-37.8,-.25,-2.52,-32.76,-.25,-2.52,-32.76,-.25,2.52],
// 4 15 -27.72 -.25 2.52 -27.72 -.25 -2.52 -22.68 -.25 -2.52 -22.68 -.25 2.52
  [4,15,-27.72,-.25,2.52,-27.72,-.25,-2.52,-22.68,-.25,-2.52,-22.68,-.25,2.52],
// 4 15 -17.64 -.25 2.52 -17.64 -.25 -2.52 -12.6 -.25 -2.52 -12.6 -.25 2.52
  [4,15,-17.64,-.25,2.52,-17.64,-.25,-2.52,-12.6,-.25,-2.52,-12.6,-.25,2.52],
// 4 15 -7.56 -.25 2.52 -7.56 -.25 -2.52 -2.52 -.25 -2.52 -2.52 -.25 2.52
  [4,15,-7.56,-.25,2.52,-7.56,-.25,-2.52,-2.52,-.25,-2.52,-2.52,-.25,2.52],
// 4 15 2.52 -.25 2.52 2.52 -.25 -2.52 7.56 -.25 -2.52 7.56 -.25 2.52
  [4,15,2.52,-.25,2.52,2.52,-.25,-2.52,7.56,-.25,-2.52,7.56,-.25,2.52],
// 4 15 12.6 -.25 2.52 12.6 -.25 -2.52 17.64 -.25 -2.52 17.64 -.25 2.52
  [4,15,12.6,-.25,2.52,12.6,-.25,-2.52,17.64,-.25,-2.52,17.64,-.25,2.52],
// 4 15 22.68 -.25 2.52 22.68 -.25 -2.52 27.72 -.25 -2.52 27.72 -.25 2.52
  [4,15,22.68,-.25,2.52,22.68,-.25,-2.52,27.72,-.25,-2.52,27.72,-.25,2.52],
// 4 15 32.76 -.25 2.52 32.76 -.25 -2.52 37.8 -.25 -2.52 37.8 -.25 2.52
  [4,15,32.76,-.25,2.52,32.76,-.25,-2.52,37.8,-.25,-2.52,37.8,-.25,2.52],
// 4 15 42.84 -.25 2.52 42.84 -.25 -2.52 47.88 -.25 -2.52 47.88 -.25 2.52
  [4,15,42.84,-.25,2.52,42.84,-.25,-2.52,47.88,-.25,-2.52,47.88,-.25,2.52],
// 4 15 52.92 -.25 2.52 52.92 -.25 -2.52 57.96 -.25 -2.52 57.96 -.25 2.52
  [4,15,52.92,-.25,2.52,52.92,-.25,-2.52,57.96,-.25,-2.52,57.96,-.25,2.52],
// 4 15 63 -.25 2.52 63 -.25 -2.52 68.04 -.25 -2.52 68.04 -.25 2.52
  [4,15,63,-.25,2.52,63,-.25,-2.52,68.04,-.25,-2.52,68.04,-.25,2.52],
// 4 15 73.08 -.25 2.52 73.08 -.25 -2.52 78 -.25 -2.52 78 -.25 2.52
  [4,15,73.08,-.25,2.52,73.08,-.25,-2.52,78,-.25,-2.52,78,-.25,2.52],
// 4 15 -73.08 -.25 -2.52 -73.08 -.25 -8 -68.04 -.25 -8 -68.04 -.25 -2.52
  [4,15,-73.08,-.25,-2.52,-73.08,-.25,-8,-68.04,-.25,-8,-68.04,-.25,-2.52],
// 4 15 -63 -.25 -2.52 -63 -.25 -8 -57.96 -.25 -8 -57.96 -.25 -2.52
  [4,15,-63,-.25,-2.52,-63,-.25,-8,-57.96,-.25,-8,-57.96,-.25,-2.52],
// 4 15 -52.92 -.25 -2.52 -52.92 -.25 -8 -47.88 -.25 -8 -47.88 -.25 -2.52
  [4,15,-52.92,-.25,-2.52,-52.92,-.25,-8,-47.88,-.25,-8,-47.88,-.25,-2.52],
// 4 15 -42.84 -.25 -2.52 -42.84 -.25 -8 -37.8 -.25 -8 -37.8 -.25 -2.52
  [4,15,-42.84,-.25,-2.52,-42.84,-.25,-8,-37.8,-.25,-8,-37.8,-.25,-2.52],
// 4 15 -32.76 -.25 -2.52 -32.76 -.25 -8 -27.72 -.25 -8 -27.72 -.25 -2.52
  [4,15,-32.76,-.25,-2.52,-32.76,-.25,-8,-27.72,-.25,-8,-27.72,-.25,-2.52],
// 4 15 -22.68 -.25 -2.52 -22.68 -.25 -8 -17.64 -.25 -8 -17.64 -.25 -2.52
  [4,15,-22.68,-.25,-2.52,-22.68,-.25,-8,-17.64,-.25,-8,-17.64,-.25,-2.52],
// 4 15 -12.6 -.25 -2.52 -12.6 -.25 -8 -7.56 -.25 -8 -7.56 -.25 -2.52
  [4,15,-12.6,-.25,-2.52,-12.6,-.25,-8,-7.56,-.25,-8,-7.56,-.25,-2.52],
// 4 15 -2.52 -.25 -2.52 -2.52 -.25 -8 2.52 -.25 -8 2.52 -.25 -2.52
  [4,15,-2.52,-.25,-2.52,-2.52,-.25,-8,2.52,-.25,-8,2.52,-.25,-2.52],
// 4 15 7.56 -.25 -2.52 7.56 -.25 -8 12.6 -.25 -8 12.6 -.25 -2.52
  [4,15,7.56,-.25,-2.52,7.56,-.25,-8,12.6,-.25,-8,12.6,-.25,-2.52],
// 4 15 17.64 -.25 -2.52 17.64 -.25 -8 22.68 -.25 -8 22.68 -.25 -2.52
  [4,15,17.64,-.25,-2.52,17.64,-.25,-8,22.68,-.25,-8,22.68,-.25,-2.52],
// 4 15 27.72 -.25 -2.52 27.72 -.25 -8 32.76 -.25 -8 32.76 -.25 -2.52
  [4,15,27.72,-.25,-2.52,27.72,-.25,-8,32.76,-.25,-8,32.76,-.25,-2.52],
// 4 15 37.8 -.25 -2.52 37.8 -.25 -8 42.84 -.25 -8 42.84 -.25 -2.52
  [4,15,37.8,-.25,-2.52,37.8,-.25,-8,42.84,-.25,-8,42.84,-.25,-2.52],
// 4 15 47.88 -.25 -2.52 47.88 -.25 -8 52.92 -.25 -8 52.92 -.25 -2.52
  [4,15,47.88,-.25,-2.52,47.88,-.25,-8,52.92,-.25,-8,52.92,-.25,-2.52],
// 4 15 57.96 -.25 -2.52 57.96 -.25 -8 63 -.25 -8 63 -.25 -2.52
  [4,15,57.96,-.25,-2.52,57.96,-.25,-8,63,-.25,-8,63,-.25,-2.52],
// 4 15 68.04 -.25 -2.52 68.04 -.25 -8 73.08 -.25 -8 73.08 -.25 -2.52
  [4,15,68.04,-.25,-2.52,68.04,-.25,-8,73.08,-.25,-8,73.08,-.25,-2.52],
];
module ldraw_lib__6142617ad(step=0, col=false, unit=2/5, alt=false, line=0.2, solid=!$preview)
    makepoly(ldraw_lib__6142617ad(), step=step, col=col, unit=unit, alt=alt, line=line, solid=solid);
ldraw_lib__6142617ad(line=0.2);
